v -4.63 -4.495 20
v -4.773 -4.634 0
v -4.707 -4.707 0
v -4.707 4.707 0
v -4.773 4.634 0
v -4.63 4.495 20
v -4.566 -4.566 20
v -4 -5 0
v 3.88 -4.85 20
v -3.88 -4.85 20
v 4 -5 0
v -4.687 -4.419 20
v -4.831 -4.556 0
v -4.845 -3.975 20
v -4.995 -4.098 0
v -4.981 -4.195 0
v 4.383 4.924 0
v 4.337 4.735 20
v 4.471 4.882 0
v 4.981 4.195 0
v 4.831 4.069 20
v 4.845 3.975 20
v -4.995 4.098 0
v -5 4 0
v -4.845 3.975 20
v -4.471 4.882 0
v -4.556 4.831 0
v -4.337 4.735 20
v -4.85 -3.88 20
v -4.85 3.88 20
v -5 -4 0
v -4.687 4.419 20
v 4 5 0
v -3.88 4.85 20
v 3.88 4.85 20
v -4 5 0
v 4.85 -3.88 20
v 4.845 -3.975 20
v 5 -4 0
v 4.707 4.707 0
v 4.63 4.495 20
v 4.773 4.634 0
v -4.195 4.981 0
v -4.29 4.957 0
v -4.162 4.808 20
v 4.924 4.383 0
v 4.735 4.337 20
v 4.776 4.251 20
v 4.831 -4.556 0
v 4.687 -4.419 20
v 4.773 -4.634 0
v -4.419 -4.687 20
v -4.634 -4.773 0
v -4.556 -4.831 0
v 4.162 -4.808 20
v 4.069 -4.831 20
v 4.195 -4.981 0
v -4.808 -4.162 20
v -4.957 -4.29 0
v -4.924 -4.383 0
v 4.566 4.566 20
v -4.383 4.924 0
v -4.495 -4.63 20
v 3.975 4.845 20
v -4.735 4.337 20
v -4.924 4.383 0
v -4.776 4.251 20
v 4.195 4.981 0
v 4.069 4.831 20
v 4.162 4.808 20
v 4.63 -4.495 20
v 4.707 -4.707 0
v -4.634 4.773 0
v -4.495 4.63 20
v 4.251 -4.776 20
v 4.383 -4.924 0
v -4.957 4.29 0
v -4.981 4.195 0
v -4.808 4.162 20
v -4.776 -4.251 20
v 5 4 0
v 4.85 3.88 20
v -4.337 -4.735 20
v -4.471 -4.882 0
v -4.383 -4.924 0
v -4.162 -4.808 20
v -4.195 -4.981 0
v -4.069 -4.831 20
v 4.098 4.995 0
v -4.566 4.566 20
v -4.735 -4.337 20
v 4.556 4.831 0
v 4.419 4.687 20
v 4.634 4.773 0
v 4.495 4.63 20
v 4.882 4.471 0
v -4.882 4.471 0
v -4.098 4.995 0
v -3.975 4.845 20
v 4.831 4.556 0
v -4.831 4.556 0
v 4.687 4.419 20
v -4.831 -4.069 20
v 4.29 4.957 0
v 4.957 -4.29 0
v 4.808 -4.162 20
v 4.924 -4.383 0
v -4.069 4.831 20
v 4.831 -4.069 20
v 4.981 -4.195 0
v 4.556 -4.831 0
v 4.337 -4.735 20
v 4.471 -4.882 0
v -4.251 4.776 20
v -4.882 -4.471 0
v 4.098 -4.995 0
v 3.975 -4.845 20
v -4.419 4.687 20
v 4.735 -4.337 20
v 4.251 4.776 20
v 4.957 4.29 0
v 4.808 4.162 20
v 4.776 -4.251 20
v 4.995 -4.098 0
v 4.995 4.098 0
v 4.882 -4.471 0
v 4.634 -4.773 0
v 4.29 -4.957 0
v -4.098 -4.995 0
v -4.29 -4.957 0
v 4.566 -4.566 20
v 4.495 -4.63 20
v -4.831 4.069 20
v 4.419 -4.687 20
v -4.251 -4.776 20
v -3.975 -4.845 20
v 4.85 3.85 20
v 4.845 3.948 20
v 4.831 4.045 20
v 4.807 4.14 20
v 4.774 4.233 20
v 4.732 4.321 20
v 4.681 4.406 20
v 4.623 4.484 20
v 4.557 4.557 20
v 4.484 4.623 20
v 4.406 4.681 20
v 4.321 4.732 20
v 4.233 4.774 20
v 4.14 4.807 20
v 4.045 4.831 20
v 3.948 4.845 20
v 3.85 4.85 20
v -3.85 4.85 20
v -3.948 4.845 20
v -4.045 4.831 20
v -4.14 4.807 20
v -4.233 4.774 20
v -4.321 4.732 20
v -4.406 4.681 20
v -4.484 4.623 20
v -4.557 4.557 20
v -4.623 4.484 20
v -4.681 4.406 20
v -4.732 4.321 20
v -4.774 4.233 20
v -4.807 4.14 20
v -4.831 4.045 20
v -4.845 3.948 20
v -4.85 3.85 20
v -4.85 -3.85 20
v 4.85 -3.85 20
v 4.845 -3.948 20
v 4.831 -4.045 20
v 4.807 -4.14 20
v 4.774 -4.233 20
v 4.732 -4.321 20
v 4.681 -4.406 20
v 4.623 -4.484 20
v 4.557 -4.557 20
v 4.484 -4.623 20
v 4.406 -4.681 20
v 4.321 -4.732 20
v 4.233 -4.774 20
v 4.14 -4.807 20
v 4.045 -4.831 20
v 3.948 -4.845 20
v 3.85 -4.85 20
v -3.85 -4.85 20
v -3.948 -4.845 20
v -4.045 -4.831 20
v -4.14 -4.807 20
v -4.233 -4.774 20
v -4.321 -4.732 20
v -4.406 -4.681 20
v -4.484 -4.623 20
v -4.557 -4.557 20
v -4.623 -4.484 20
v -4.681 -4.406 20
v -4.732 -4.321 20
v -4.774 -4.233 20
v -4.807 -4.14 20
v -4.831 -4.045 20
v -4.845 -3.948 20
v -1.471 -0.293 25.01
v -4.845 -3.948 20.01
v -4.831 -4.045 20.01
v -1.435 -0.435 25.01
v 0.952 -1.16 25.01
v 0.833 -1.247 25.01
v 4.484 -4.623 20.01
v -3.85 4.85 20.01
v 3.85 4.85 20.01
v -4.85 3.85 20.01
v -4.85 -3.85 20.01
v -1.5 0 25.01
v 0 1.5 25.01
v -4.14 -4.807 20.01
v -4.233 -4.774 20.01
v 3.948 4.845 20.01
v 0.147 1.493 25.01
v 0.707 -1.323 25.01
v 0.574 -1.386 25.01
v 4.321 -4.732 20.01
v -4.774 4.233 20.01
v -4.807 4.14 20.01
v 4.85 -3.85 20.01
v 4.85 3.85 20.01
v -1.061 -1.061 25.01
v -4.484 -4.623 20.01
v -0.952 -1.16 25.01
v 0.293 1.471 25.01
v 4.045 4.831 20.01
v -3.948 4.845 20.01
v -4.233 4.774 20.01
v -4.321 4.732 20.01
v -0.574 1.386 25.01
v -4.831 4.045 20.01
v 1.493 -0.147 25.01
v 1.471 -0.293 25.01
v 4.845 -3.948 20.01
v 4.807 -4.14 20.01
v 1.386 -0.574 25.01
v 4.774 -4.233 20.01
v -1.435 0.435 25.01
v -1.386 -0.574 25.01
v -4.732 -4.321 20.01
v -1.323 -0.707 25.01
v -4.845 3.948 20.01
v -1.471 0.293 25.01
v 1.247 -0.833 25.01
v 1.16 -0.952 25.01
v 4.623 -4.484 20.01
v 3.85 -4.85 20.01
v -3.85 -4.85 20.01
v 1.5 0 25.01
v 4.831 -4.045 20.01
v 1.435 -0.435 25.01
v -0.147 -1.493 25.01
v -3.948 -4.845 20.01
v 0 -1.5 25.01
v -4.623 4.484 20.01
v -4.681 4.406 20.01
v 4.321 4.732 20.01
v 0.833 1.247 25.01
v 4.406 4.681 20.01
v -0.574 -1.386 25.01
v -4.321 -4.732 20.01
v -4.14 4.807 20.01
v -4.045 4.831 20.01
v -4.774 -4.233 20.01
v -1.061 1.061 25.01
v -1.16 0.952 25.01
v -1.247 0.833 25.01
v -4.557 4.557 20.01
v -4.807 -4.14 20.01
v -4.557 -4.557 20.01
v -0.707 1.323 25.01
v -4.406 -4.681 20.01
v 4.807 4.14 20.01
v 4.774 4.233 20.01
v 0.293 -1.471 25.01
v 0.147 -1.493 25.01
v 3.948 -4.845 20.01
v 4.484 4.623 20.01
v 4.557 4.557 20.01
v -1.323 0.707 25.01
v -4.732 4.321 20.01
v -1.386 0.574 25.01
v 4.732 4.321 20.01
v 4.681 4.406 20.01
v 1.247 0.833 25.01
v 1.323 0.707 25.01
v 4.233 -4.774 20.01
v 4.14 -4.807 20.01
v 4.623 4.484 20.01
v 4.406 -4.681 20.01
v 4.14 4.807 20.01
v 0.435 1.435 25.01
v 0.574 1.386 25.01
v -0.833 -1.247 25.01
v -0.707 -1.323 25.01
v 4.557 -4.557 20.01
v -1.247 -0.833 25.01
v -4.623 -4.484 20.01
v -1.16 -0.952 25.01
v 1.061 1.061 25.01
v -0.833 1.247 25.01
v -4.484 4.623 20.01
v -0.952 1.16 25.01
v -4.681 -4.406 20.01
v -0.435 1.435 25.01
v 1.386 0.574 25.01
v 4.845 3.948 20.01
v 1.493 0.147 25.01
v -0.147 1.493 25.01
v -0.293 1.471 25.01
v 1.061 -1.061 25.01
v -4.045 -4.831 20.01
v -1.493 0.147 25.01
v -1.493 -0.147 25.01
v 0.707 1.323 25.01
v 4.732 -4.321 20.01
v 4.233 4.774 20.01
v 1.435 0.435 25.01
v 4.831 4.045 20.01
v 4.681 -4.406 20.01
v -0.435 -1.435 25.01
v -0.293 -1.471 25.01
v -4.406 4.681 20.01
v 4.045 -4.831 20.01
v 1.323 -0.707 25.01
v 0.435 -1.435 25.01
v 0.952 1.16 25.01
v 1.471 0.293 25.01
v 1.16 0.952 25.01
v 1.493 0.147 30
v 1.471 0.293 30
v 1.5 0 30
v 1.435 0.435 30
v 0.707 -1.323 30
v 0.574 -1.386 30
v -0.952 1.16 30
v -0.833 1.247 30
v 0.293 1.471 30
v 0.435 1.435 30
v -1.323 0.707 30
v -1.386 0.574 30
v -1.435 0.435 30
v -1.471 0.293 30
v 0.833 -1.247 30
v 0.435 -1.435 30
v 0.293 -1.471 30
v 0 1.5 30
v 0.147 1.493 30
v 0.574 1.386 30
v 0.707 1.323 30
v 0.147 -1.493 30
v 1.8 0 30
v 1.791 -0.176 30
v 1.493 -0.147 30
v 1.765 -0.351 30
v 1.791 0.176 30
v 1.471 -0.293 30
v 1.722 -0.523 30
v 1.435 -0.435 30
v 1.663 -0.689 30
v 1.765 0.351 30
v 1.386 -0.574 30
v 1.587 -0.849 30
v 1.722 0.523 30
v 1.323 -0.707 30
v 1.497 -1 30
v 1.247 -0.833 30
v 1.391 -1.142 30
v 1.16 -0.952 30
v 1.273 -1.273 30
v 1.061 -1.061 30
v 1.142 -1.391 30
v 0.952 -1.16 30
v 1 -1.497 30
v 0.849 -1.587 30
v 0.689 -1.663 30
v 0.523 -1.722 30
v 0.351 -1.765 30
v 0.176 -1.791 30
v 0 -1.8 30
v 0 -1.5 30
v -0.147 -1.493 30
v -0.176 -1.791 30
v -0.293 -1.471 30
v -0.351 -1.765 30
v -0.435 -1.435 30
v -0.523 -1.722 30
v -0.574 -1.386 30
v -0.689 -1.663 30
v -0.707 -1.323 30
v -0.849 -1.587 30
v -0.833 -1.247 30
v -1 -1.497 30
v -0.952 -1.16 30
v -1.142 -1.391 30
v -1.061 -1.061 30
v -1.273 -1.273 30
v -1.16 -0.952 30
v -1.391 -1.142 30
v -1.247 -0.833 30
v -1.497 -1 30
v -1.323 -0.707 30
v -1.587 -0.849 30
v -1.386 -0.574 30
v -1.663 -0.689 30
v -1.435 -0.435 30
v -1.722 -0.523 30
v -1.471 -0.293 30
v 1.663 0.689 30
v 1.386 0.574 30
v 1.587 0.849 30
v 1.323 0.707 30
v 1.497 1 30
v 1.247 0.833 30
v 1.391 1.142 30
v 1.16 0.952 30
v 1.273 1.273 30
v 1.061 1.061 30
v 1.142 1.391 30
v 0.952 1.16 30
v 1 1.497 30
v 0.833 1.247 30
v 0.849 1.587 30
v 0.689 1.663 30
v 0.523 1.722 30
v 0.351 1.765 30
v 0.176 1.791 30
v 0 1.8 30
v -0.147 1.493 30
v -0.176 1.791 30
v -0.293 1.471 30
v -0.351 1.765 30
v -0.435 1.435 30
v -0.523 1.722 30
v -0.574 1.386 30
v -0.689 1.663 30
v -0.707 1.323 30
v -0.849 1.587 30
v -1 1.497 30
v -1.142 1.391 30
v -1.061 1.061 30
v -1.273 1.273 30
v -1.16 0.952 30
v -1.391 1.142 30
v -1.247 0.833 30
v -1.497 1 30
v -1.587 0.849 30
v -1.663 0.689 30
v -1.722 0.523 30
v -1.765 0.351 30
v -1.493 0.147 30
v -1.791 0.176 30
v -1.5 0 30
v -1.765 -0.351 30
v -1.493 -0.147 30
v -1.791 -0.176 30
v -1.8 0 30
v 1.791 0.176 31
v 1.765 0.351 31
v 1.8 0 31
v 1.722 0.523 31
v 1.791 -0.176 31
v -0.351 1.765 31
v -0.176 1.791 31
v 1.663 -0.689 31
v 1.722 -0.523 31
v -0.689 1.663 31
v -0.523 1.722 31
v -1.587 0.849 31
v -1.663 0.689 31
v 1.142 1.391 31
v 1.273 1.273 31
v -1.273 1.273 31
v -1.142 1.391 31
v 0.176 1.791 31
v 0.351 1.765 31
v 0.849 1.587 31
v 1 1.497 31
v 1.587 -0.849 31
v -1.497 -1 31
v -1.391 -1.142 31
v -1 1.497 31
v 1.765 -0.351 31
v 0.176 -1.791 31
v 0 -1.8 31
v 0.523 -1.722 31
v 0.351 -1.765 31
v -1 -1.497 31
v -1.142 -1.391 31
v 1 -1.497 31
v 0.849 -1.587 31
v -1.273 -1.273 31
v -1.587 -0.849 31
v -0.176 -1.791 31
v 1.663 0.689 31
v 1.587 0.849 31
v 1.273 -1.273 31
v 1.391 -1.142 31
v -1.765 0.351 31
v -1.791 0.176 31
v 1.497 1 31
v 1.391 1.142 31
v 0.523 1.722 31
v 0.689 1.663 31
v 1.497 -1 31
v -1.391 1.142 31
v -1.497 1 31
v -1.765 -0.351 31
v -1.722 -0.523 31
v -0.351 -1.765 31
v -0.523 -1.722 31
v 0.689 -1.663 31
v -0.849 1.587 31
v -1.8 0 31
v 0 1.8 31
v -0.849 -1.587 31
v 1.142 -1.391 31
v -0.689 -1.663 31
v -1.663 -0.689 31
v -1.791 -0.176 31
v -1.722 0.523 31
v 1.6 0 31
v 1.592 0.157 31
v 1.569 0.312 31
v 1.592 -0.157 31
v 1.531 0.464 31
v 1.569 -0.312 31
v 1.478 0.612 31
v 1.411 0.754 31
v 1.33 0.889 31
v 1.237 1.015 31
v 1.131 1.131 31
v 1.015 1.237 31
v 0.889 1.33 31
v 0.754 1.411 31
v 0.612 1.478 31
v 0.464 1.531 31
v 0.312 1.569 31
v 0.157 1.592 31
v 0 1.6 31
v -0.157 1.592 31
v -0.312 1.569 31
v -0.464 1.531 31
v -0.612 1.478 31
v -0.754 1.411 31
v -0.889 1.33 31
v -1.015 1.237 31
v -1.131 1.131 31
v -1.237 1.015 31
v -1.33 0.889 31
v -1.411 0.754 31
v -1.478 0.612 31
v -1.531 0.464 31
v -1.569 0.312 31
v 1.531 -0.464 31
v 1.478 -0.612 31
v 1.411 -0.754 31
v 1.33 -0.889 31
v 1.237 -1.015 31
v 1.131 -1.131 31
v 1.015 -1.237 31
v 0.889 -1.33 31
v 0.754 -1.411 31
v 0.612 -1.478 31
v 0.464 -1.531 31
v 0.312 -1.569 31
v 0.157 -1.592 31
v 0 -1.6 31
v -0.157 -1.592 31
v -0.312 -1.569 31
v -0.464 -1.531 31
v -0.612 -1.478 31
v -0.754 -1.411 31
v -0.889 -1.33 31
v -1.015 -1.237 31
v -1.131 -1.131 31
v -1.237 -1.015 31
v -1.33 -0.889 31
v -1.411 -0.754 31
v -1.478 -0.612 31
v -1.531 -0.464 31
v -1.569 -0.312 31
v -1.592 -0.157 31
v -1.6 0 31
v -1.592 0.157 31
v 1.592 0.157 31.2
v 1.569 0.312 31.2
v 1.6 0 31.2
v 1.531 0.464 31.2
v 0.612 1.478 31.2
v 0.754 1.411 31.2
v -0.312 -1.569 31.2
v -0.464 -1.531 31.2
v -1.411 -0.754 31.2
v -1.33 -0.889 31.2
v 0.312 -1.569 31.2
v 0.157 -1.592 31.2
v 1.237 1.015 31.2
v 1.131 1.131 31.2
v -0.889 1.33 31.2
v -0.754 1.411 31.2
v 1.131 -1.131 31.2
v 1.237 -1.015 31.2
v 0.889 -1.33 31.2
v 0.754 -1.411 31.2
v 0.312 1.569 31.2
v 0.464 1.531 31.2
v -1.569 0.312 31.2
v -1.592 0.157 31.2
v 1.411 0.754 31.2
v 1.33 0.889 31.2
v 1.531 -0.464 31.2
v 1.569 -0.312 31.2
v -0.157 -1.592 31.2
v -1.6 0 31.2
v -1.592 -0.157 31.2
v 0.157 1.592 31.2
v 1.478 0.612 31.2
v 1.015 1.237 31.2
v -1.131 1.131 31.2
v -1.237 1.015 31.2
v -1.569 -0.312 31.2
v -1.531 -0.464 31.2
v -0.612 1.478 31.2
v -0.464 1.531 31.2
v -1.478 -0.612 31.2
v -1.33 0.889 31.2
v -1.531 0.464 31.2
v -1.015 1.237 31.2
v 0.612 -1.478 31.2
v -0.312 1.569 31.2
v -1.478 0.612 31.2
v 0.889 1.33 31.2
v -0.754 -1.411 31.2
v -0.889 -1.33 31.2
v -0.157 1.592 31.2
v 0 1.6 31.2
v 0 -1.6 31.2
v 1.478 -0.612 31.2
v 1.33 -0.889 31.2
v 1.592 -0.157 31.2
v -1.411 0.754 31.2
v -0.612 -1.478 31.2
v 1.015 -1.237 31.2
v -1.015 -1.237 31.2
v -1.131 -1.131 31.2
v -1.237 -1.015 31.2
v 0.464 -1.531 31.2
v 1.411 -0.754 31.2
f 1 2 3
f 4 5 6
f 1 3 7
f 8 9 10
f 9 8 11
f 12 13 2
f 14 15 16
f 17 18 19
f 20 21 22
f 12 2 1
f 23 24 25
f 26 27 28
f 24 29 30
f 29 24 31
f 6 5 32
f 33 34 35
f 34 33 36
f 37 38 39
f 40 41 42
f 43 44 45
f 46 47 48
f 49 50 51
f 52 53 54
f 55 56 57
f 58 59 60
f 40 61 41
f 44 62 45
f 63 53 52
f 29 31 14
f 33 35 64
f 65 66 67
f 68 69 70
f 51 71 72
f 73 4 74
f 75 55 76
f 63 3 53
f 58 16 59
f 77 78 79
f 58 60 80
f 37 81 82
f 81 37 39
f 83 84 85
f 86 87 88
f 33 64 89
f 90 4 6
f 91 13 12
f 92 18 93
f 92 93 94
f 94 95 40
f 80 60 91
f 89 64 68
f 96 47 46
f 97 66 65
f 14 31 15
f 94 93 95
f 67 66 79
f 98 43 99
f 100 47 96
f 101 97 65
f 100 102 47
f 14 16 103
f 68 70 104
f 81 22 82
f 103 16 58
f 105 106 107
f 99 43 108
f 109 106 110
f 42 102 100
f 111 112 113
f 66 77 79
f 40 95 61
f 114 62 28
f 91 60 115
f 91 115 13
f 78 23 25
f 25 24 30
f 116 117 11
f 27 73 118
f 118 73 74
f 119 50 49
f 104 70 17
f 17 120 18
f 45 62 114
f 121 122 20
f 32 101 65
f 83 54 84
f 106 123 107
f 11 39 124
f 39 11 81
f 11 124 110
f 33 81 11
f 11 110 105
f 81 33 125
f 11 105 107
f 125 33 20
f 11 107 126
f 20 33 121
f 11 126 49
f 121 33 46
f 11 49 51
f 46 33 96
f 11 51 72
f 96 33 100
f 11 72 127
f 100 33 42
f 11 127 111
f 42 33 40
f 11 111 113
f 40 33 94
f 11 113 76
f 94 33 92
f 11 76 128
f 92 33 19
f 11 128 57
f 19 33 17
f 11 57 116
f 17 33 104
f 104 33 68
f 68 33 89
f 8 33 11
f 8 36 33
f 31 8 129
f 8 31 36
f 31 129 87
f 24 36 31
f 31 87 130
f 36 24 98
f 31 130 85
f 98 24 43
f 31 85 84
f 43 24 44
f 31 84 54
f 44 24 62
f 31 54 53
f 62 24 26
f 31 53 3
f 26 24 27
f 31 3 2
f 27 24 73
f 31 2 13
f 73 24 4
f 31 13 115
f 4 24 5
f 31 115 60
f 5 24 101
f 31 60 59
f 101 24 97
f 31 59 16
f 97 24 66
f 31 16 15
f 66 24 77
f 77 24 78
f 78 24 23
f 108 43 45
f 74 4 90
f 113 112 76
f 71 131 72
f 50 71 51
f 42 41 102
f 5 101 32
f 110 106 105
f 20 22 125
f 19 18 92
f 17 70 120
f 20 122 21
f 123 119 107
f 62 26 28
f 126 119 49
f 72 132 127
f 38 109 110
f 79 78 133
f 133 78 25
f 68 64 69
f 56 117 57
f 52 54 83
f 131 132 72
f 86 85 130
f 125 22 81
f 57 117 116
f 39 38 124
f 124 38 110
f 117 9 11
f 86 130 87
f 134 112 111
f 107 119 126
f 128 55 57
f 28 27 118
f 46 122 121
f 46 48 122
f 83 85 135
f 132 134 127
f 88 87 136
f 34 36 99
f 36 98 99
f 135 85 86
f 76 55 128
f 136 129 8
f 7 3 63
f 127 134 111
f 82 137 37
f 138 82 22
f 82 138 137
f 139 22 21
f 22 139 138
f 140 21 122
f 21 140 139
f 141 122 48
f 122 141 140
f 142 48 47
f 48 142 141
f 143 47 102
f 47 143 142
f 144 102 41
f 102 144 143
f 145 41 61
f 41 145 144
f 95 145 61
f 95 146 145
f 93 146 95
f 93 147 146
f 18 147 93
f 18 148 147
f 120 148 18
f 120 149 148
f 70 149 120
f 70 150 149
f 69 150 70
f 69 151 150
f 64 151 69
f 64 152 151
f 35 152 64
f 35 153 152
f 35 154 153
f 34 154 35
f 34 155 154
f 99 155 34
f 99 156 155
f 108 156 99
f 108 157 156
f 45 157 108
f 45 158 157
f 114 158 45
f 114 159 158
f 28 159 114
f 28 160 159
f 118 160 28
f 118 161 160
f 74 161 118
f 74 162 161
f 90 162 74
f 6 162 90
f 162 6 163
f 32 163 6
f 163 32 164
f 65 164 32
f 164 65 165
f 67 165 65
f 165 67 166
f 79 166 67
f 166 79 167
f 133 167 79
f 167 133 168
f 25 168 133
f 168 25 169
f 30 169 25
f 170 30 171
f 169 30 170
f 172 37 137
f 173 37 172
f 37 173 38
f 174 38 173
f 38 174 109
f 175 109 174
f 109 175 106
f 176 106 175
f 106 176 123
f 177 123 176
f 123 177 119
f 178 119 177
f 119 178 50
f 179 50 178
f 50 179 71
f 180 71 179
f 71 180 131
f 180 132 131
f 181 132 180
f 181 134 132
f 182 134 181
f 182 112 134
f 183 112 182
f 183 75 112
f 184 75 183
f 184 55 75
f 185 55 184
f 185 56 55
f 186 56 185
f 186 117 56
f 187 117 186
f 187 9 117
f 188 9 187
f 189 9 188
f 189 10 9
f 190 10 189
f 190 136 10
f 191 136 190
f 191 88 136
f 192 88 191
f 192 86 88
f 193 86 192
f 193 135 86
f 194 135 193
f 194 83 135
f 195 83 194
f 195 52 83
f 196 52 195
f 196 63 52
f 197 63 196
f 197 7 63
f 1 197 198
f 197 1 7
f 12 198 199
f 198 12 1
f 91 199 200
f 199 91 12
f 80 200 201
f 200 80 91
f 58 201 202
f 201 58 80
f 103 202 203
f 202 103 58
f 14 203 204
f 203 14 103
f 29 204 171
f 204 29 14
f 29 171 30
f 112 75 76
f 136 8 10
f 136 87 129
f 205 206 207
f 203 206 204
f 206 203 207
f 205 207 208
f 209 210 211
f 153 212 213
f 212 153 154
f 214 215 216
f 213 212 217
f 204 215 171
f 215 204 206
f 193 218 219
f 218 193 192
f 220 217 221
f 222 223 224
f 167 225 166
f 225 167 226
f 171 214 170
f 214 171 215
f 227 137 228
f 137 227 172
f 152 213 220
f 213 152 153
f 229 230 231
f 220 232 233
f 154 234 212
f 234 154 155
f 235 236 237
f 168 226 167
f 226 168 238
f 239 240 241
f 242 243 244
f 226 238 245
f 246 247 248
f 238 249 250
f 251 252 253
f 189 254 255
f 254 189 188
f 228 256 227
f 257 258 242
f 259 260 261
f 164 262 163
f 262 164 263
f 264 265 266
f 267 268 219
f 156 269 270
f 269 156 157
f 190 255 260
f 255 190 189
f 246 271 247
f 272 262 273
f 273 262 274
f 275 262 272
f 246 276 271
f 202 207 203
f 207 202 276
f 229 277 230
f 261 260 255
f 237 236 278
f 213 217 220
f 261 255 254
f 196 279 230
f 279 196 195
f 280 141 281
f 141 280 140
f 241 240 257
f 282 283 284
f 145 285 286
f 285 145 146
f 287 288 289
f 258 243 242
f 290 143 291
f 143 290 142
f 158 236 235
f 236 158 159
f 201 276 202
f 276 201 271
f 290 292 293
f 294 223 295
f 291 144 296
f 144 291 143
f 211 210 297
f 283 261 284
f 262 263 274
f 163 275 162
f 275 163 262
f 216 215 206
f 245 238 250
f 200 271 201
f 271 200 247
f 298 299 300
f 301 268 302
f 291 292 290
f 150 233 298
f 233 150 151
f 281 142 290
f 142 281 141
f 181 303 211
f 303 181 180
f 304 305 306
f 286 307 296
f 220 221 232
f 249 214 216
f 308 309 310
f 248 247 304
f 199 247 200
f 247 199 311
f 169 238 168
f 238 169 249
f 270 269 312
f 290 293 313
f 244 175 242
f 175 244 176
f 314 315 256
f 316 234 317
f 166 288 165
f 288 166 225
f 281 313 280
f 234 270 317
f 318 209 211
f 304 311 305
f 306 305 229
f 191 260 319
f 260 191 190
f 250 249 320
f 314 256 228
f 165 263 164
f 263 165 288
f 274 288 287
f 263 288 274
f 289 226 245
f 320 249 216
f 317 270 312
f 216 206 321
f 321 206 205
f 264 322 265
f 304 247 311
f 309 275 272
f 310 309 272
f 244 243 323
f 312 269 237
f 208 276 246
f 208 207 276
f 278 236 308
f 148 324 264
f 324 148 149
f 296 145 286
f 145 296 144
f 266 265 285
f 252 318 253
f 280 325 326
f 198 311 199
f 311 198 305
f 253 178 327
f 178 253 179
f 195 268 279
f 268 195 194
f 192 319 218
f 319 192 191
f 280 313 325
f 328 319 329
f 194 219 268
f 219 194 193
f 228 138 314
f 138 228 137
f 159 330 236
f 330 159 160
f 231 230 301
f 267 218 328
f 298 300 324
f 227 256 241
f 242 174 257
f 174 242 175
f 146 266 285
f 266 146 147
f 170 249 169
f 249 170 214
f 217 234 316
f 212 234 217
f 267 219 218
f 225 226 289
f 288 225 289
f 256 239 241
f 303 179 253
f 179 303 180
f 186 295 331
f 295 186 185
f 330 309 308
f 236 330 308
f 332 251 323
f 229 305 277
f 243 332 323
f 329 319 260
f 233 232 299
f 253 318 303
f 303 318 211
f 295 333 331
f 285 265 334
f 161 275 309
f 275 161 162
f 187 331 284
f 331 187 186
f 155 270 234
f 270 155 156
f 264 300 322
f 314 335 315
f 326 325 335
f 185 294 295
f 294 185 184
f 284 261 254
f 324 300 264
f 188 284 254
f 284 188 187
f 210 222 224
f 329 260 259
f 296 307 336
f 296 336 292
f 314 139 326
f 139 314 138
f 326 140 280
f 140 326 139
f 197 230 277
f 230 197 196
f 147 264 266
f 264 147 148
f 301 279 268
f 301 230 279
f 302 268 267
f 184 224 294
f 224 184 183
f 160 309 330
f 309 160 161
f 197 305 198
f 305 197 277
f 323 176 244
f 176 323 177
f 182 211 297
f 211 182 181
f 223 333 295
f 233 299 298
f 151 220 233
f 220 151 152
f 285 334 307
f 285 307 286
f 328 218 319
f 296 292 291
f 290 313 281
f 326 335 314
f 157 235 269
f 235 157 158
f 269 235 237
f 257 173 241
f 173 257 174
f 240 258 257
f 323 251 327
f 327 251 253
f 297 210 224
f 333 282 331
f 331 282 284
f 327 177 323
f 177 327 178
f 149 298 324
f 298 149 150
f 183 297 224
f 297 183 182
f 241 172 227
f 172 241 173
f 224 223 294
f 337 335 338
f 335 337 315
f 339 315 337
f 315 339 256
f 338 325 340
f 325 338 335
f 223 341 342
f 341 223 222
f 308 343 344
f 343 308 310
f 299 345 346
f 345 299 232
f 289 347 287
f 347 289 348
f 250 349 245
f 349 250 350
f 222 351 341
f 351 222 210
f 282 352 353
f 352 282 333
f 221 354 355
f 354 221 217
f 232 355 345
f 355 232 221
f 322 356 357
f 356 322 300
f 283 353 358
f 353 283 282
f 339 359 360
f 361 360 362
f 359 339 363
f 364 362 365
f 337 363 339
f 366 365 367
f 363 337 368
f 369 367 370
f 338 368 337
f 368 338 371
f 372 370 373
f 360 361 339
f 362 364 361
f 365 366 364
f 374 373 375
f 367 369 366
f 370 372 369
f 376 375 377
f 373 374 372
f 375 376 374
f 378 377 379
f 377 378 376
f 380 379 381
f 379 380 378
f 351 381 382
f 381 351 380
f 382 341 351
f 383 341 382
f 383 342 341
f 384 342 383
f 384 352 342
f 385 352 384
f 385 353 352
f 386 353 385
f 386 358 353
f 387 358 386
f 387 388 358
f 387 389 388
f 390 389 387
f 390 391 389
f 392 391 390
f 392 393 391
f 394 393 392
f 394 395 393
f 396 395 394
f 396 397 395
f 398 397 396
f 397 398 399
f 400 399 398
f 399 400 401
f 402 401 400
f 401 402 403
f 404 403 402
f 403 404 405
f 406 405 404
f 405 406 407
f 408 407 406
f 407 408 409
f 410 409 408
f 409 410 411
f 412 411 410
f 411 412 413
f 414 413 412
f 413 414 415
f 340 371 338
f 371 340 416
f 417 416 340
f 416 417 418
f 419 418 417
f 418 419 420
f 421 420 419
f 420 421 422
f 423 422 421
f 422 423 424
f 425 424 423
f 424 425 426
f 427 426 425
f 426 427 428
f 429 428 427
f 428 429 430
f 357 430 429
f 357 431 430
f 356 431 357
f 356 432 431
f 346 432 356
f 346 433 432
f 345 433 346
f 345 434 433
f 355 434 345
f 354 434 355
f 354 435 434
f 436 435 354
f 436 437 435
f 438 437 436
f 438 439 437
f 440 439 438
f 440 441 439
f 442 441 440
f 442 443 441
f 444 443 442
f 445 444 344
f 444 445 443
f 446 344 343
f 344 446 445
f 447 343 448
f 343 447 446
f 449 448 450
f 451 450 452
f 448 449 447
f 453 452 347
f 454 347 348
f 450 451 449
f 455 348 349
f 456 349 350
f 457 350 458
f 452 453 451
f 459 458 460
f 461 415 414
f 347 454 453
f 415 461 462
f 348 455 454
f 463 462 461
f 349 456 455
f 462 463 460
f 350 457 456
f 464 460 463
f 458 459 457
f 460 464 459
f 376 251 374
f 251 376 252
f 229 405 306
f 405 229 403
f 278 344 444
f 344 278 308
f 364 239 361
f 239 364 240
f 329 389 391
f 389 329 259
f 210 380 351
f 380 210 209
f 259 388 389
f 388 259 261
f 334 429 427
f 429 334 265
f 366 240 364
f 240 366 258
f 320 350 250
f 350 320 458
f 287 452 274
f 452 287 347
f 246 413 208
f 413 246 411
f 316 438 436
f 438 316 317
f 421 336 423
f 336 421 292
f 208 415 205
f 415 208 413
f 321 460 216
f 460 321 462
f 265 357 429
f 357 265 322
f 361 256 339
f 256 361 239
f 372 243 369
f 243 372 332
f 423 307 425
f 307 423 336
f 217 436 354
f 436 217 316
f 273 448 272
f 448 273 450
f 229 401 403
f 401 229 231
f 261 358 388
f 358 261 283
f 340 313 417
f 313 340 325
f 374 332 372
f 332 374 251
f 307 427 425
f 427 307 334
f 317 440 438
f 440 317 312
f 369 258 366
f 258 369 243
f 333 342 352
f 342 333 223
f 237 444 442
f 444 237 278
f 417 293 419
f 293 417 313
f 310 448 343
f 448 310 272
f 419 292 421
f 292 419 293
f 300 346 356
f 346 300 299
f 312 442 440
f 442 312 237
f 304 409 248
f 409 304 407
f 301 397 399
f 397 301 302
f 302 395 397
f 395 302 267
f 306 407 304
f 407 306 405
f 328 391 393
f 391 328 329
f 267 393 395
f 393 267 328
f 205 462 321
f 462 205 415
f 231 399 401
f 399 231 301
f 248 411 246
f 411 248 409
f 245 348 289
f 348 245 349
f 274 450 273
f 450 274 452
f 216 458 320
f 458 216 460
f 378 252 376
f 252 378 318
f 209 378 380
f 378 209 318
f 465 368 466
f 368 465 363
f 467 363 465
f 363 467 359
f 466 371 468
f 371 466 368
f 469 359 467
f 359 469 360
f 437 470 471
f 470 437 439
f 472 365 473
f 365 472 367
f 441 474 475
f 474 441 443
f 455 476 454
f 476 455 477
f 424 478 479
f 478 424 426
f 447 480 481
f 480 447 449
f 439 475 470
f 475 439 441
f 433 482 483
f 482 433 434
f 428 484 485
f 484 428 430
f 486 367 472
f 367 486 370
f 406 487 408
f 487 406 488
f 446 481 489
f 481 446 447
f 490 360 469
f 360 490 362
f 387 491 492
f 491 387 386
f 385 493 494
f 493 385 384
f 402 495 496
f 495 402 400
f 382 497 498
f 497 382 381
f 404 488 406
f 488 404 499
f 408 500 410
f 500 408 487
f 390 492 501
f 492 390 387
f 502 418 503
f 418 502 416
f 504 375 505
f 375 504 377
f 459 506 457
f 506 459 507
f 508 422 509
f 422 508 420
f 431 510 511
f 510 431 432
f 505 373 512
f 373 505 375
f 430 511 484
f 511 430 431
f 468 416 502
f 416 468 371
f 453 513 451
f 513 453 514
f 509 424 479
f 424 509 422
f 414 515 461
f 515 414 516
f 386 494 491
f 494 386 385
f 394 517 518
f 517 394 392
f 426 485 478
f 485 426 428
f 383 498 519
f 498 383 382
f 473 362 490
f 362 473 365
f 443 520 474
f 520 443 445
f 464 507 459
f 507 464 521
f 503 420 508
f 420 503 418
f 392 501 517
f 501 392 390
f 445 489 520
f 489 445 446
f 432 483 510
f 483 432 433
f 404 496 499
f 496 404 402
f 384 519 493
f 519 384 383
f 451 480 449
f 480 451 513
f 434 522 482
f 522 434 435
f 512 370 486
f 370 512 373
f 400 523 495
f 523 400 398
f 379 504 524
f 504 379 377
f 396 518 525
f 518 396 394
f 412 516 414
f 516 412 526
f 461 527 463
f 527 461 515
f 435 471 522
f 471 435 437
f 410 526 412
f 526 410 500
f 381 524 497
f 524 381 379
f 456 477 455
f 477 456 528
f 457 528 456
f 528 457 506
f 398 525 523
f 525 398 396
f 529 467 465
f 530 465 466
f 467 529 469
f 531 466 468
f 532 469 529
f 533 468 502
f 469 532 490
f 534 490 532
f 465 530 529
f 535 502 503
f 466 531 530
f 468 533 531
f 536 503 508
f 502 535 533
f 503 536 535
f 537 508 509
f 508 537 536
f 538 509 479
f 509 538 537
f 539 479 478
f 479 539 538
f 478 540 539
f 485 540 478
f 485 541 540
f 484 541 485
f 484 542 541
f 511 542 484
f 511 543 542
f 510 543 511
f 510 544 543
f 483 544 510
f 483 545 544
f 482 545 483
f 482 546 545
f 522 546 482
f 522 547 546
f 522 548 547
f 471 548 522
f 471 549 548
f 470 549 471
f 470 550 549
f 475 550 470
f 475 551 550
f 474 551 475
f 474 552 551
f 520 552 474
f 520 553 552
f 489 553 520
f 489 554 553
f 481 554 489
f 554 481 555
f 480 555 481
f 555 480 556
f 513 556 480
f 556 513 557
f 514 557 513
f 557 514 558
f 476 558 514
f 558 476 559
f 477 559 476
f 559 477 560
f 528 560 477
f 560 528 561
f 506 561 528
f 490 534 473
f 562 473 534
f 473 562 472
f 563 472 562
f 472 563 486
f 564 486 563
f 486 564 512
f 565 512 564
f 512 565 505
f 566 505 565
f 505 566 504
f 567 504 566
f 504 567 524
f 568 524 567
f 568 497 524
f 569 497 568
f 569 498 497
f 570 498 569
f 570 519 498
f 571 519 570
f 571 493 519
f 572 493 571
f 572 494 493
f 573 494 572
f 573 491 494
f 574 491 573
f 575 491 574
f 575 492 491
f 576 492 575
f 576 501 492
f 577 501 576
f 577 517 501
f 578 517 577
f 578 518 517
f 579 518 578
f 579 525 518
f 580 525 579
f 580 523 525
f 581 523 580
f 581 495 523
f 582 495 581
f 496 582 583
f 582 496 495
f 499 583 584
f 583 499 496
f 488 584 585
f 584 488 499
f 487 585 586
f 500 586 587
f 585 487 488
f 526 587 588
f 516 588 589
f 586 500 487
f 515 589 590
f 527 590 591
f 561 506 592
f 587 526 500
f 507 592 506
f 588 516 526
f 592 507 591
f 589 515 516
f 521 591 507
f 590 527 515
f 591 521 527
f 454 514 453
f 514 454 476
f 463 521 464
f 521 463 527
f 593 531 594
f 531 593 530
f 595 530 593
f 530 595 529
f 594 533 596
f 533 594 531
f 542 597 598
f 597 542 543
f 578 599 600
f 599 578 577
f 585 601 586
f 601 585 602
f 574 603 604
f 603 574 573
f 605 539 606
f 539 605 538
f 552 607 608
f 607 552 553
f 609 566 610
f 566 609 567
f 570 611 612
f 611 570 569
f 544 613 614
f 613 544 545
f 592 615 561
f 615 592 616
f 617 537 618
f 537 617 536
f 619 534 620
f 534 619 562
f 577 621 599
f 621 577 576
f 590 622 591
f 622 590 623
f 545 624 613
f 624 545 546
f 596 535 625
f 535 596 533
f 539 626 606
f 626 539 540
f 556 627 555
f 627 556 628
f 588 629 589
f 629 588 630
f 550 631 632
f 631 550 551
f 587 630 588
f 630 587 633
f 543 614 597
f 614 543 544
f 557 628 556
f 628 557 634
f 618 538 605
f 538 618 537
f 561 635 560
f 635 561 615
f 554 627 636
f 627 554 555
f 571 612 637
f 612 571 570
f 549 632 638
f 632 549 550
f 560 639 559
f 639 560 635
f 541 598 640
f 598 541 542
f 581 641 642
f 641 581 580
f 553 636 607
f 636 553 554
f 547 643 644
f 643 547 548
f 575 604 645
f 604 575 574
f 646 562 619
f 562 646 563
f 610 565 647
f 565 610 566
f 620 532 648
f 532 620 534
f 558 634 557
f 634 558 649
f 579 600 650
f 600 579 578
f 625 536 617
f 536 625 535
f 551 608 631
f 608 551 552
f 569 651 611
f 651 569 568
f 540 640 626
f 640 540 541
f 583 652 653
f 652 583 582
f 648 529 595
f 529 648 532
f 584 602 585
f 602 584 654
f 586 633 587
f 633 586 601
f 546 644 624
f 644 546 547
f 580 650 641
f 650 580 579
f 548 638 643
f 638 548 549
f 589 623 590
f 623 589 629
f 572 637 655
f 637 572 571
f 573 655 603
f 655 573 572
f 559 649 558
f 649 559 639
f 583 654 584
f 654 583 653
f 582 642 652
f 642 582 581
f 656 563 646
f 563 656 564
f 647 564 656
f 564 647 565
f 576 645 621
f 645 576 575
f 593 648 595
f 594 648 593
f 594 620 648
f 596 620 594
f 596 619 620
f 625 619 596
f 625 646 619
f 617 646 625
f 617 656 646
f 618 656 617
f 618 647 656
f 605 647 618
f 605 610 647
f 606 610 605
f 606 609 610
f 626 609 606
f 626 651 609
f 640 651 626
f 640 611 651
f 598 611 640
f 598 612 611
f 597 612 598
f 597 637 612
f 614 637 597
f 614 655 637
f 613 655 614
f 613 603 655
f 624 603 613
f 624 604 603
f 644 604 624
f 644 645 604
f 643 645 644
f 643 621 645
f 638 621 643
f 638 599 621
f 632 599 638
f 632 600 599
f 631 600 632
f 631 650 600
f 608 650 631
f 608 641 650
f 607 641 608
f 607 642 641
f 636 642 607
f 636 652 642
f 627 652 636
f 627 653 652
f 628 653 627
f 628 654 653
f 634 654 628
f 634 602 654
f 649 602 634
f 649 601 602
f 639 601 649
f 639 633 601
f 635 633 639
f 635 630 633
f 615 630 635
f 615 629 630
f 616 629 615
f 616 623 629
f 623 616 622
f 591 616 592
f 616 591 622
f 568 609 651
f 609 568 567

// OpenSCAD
// ============================================================
// Square Whiskey Bottle (Jack Daniel's style, no label)
// ============================================================
// Open this file in OpenSCAD (openscad.org) to view/render it.
// Adjust the parameters below to change proportions.

$fn = 64; // smoothness of curves

// ---- Parameters ----
body_width      = 10;   // side-to-side width of the square body
body_depth      = 10;   // front-to-back depth of the square body
body_height     = 20;  // height of the main square section
corner_radius   = 1;   // roundness of the body's corners
body_taper      = 0.97; // slight inward taper from bottom to top (1 = none)

shoulder_height = 5;   // height of the sloped shoulder section

neck_diameter   = 3;   // diameter of the cylindrical neck
neck_height     = 5;   // height of the neck

finish_diameter = 3.6;   // diameter of the bottle "finish" (mouth/cap area)
finish_height   = 1;    // height of the finish
lip_diameter    = 3.2;   // small lip ring under the very top opening
lip_height      = 0.2;

wall_thickness  = 3;    // used only if HOLLOW = true
HOLLOW          = false; // set true for a printable hollow shell

// ---- Helper: rounded square profile ----
module rounded_square(w, d, r) {
    hull() {
        for (x = [-1, 1], y = [-1, 1])
            translate([x * (w/2 - r), y * (d/2 - r), 0])
                circle(r = r);
    }
}

// ---- Main bottle shape ----
module bottle_solid() {
    union() {
        // Square body (slightly tapered for a nicer silhouette)
        translate([0, 0, body_height/2])
            linear_extrude(height = body_height, center = true, scale = body_taper)
                rounded_square(body_width, body_depth, corner_radius);

        // Shoulder: transitions from the square body to the round neck
        translate([0, 0, body_height])
            hull() {
                linear_extrude(height = 0.01)
                    rounded_square(body_width * body_taper, body_depth * body_taper, corner_radius);
                translate([0, 0, shoulder_height])
                    cylinder(d = neck_diameter, h = 0.01);
            }

        // Neck
        translate([0, 0, body_height + shoulder_height])
            cylinder(d = neck_diameter, h = neck_height);

        // Finish (wider section near the top, like a cap seat)
        translate([0, 0, body_height + shoulder_height + neck_height])
            cylinder(d = finish_diameter, h = finish_height);

        // Small lip ring at the very top
        translate([0, 0, body_height + shoulder_height + neck_height + finish_height])
            cylinder(d = lip_diameter, h = lip_height);
    }
}

// ---- Optional hollow shell (approximate, for printable bottles) ----
module bottle_hollow() {
    difference() {
        bottle_solid();
        translate([0, 0, wall_thickness])
            scale([
                (body_width  - 2*wall_thickness) / body_width,
                (body_depth  - 2*wall_thickness) / body_depth,
                1
            ])
                bottle_solid();
    }
}

// ---- Render ----
if (HOLLOW)
    bottle_hollow();
else
    bottle_solid();
